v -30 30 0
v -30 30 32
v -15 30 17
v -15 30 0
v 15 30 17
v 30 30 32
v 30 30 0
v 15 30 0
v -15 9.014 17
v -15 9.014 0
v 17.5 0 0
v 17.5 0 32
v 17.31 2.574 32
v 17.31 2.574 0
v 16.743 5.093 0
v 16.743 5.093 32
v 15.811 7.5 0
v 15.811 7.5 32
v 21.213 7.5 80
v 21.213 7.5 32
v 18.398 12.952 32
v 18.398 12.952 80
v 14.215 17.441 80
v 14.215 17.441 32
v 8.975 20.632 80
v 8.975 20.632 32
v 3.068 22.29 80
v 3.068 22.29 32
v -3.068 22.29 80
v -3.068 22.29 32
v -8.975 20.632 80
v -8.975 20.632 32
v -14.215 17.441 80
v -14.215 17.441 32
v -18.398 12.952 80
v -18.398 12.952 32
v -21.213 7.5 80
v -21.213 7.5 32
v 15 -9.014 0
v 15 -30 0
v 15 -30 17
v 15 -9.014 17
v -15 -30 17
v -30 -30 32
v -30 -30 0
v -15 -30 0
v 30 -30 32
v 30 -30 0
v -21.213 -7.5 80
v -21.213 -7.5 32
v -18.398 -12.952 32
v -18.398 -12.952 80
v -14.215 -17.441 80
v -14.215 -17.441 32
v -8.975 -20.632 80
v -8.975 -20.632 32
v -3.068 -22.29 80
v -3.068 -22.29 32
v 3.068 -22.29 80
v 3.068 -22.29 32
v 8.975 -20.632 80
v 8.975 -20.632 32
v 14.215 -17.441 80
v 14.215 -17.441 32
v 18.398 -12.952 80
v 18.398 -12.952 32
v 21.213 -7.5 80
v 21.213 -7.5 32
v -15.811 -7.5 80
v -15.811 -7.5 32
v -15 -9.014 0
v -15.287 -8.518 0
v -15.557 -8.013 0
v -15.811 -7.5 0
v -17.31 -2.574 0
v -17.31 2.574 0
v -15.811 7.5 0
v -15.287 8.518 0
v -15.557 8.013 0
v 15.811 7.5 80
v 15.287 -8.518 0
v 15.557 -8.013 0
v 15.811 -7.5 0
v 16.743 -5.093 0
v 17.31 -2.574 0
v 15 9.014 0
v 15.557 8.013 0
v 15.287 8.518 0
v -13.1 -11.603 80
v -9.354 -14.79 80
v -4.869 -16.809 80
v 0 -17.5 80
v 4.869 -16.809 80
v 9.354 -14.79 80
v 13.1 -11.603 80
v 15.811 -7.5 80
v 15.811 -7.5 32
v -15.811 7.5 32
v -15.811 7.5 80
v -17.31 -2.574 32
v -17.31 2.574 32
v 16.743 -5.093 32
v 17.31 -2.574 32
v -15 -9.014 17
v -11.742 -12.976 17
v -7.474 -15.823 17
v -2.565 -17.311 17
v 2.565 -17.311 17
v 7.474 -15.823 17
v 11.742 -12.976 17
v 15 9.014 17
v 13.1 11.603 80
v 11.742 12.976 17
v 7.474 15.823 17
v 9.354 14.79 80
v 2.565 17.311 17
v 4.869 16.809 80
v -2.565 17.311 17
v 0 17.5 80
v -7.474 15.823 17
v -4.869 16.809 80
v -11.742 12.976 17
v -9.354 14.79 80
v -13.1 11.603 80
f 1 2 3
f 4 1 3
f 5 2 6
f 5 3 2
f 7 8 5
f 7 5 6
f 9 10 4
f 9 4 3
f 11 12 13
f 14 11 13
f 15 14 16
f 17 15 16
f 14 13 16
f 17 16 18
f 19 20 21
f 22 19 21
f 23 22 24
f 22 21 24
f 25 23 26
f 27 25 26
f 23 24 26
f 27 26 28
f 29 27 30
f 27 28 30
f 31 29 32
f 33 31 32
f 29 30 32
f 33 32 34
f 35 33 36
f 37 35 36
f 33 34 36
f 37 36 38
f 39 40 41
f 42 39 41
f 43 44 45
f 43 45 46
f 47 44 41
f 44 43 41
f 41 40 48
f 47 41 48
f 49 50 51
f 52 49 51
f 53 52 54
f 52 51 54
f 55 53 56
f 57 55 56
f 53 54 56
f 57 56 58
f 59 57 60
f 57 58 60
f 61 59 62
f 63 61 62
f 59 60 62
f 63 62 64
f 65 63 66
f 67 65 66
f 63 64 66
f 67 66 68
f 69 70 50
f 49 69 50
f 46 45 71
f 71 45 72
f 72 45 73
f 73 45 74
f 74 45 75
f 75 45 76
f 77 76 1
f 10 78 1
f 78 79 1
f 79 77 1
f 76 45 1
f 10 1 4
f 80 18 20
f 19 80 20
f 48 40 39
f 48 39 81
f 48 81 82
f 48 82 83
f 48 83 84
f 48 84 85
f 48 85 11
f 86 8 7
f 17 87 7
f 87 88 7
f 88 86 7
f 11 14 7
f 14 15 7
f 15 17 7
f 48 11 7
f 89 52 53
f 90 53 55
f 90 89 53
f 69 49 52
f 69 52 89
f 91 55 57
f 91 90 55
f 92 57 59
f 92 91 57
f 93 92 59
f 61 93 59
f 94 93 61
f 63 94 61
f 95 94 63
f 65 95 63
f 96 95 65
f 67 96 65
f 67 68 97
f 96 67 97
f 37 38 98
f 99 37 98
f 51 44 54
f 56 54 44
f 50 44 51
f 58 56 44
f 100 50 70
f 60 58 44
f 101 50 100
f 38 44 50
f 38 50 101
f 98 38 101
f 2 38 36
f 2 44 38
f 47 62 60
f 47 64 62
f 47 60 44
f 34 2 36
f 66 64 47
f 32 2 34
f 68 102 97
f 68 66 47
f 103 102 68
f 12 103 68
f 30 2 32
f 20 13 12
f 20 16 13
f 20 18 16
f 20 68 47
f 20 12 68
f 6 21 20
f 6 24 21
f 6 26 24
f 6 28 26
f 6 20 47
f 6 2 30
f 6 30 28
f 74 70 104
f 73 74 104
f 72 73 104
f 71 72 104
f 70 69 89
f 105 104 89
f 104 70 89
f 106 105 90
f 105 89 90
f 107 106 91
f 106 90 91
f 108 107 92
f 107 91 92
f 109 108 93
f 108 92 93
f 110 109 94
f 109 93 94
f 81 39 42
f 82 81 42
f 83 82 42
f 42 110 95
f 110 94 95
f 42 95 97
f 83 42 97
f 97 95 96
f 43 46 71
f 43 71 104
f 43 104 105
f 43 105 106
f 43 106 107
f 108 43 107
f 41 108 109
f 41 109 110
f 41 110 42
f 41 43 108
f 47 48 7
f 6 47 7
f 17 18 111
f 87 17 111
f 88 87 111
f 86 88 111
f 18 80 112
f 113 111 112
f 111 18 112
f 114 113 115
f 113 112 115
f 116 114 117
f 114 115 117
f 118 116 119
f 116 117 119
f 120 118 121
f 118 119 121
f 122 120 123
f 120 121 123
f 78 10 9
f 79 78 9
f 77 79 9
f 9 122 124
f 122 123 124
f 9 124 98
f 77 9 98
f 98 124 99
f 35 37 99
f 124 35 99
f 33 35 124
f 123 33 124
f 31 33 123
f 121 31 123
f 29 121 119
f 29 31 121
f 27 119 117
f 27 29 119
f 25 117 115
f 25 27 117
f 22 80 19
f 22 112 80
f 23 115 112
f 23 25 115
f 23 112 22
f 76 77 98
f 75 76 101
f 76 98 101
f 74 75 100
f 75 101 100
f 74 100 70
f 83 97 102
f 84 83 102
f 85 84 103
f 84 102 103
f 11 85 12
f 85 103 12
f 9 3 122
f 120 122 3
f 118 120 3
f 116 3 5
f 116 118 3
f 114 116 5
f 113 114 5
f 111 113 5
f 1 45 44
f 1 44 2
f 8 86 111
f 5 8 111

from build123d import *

# Parameters (mm, degrees)
F0_W     = 60
F0_H     = 60
F1_DEPTH = 32
F3_DEPTH = 48
F5_DEPTH = 32
F6_W     = 30
F6_H     = 17
F7_DEPTH = 60


with BuildPart() as f1:
    # F0 (on Top) → F1 (new body)
    with BuildSketch(Plane.XY):
        Rectangle(F0_W, F0_H)
    extrude(amount=F1_DEPTH)

    # F2 (on face) → F3 (join)
    with BuildSketch(Plane.XY.offset(32)):
        with BuildLine():
            Line((15.811388, 7.5), (21.213203, 7.5))
            ThreePointArc((21.213203, 7.5), (0, 22.5), (-21.213203, 7.5))
            Line((-21.213203, 7.5), (-15.811388, 7.5))
            ThreePointArc((-15.811388, 7.5), (0, 17.5), (15.811388, 7.5))
        make_face()
        with BuildLine():
            ThreePointArc((15.811388, -7.5), (0, -17.5), (-15.811388, -7.5))
            Line((-15.811388, -7.5), (-21.213203, -7.5))
            ThreePointArc((-21.213203, -7.5), (0, -22.5), (21.213203, -7.5))
            Line((21.213203, -7.5), (15.811388, -7.5))
        make_face()
    extrude(amount=F3_DEPTH)

    # F4 (on face) → F5 (cut)
    with BuildSketch(Plane.XY.offset(32)):
        with BuildLine():
            ThreePointArc((15.811388, -7.5), (17.072629, -3.843872), (17.5, 0))
            ThreePointArc((17.5, 0), (17.072629, 3.843872), (15.811388, 7.5))
            ThreePointArc((15.811388, 7.5), (0, 17.5), (-15.811388, 7.5))
            ThreePointArc((-15.811388, 7.5), (-17.5, 0), (-15.811388, -7.5))
            ThreePointArc((-15.811388, -7.5), (0, -17.5), (15.811388, -7.5))
        make_face()
    extrude(amount=-F5_DEPTH, mode=Mode.SUBTRACT)

    # F6 (on face) → F7 (cut)
    with BuildSketch(Plane.XZ.offset(30)):
        with Locations((0, 8.5)):
            Rectangle(F6_W, F6_H)
    extrude(amount=-F7_DEPTH, mode=Mode.SUBTRACT)


solid = f1.part
